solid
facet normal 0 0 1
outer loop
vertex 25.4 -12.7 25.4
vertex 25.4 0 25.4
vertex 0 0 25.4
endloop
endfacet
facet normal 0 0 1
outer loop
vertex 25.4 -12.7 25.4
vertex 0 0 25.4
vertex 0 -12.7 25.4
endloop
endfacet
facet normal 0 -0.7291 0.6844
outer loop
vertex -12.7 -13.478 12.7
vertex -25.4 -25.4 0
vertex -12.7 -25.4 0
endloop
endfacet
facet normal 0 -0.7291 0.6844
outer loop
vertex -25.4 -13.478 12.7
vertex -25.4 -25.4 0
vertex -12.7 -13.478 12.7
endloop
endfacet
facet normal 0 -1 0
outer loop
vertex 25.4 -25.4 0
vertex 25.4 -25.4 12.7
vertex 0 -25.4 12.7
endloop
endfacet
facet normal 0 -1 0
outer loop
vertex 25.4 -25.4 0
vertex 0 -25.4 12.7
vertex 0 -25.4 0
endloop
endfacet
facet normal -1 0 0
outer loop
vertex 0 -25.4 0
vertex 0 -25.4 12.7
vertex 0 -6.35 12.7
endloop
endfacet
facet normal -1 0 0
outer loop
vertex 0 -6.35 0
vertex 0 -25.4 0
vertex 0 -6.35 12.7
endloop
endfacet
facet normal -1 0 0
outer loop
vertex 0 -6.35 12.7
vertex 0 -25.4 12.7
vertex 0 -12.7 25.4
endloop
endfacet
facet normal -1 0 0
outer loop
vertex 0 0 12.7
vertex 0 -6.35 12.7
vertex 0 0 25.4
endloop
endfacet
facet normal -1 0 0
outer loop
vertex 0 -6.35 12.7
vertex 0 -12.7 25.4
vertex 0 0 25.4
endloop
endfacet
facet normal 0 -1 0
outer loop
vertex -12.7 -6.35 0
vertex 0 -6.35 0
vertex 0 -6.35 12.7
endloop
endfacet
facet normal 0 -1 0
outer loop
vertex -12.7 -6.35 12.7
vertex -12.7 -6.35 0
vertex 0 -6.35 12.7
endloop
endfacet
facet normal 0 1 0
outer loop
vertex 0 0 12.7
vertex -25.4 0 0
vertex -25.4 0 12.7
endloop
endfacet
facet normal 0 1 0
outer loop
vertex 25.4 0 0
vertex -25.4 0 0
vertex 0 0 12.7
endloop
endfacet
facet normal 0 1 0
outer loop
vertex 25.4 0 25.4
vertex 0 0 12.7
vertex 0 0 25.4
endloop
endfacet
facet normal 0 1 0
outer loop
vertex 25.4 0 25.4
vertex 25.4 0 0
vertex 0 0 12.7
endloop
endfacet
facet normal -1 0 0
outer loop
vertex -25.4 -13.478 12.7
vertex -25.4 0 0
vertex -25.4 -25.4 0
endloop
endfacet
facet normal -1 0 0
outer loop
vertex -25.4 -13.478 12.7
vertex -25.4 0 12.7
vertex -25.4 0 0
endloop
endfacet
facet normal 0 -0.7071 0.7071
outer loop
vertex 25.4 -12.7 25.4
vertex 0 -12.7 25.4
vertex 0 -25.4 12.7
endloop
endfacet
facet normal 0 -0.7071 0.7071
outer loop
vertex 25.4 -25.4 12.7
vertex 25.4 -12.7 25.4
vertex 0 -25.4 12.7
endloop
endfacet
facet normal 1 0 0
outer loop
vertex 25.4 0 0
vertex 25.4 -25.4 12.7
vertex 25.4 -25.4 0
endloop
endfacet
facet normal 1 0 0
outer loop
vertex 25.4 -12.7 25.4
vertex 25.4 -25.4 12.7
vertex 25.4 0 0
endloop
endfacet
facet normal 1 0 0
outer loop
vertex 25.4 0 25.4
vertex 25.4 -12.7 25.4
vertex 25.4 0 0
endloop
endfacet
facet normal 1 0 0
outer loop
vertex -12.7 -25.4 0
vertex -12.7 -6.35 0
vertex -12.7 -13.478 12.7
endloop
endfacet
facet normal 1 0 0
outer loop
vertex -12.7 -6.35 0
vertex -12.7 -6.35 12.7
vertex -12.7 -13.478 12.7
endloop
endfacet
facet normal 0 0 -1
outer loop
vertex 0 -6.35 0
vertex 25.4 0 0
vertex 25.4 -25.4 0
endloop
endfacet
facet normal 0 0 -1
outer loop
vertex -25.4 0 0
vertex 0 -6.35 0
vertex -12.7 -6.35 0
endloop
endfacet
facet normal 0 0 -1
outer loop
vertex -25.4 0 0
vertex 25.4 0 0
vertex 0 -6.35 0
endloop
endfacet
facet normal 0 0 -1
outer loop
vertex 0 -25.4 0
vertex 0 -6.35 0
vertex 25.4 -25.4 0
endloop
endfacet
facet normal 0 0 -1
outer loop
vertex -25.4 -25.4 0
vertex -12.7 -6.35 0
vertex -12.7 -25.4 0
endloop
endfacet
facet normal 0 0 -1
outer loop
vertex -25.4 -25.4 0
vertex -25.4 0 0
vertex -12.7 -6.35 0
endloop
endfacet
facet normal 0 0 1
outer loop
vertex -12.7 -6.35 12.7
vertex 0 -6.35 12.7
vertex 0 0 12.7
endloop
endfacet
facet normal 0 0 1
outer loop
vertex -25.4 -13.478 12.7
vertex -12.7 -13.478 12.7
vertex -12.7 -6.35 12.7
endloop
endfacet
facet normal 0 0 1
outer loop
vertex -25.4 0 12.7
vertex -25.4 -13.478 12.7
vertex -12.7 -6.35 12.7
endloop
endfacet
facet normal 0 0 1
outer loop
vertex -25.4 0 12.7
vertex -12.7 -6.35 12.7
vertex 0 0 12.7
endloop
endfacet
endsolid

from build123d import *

# Parameters (mm, degrees)
F1_DEPTH = 25.4
F2_W     = 6.35
F2_H     = 12.7
F3_DEPTH = 25.4
F5_DEPTH = 12.7


with BuildPart() as f1:
    # F0 (on Right) → F1 (new body)
    with BuildSketch(Plane.YZ):
        Polygon((-25.4, 0), (0, 0), (0, 25.4), (-12.7, 25.4), (-25.4, 12.7), align=None)
    extrude(amount=F1_DEPTH)

    # F2 (on face) → F3 (join)
    with BuildSketch(Plane(origin=(0, 0, 0), x_dir=(0, -1, 0), z_dir=(-1, 0, 0))):
        with Locations((3.175, 6.35)):
            Rectangle(F2_W, F2_H)
    extrude(amount=F3_DEPTH)

    # F4 (on face) → F5 (join)
    with BuildSketch(Plane(origin=(-25.4, 0, 0), x_dir=(0, -1, 0), z_dir=(-1, 0, 0))):
        Polygon((6.35, 0), (25.4, 0), (13.477535, 12.7), (6.35, 12.7), align=None)
    extrude(amount=-F5_DEPTH)


solid = f1.part
